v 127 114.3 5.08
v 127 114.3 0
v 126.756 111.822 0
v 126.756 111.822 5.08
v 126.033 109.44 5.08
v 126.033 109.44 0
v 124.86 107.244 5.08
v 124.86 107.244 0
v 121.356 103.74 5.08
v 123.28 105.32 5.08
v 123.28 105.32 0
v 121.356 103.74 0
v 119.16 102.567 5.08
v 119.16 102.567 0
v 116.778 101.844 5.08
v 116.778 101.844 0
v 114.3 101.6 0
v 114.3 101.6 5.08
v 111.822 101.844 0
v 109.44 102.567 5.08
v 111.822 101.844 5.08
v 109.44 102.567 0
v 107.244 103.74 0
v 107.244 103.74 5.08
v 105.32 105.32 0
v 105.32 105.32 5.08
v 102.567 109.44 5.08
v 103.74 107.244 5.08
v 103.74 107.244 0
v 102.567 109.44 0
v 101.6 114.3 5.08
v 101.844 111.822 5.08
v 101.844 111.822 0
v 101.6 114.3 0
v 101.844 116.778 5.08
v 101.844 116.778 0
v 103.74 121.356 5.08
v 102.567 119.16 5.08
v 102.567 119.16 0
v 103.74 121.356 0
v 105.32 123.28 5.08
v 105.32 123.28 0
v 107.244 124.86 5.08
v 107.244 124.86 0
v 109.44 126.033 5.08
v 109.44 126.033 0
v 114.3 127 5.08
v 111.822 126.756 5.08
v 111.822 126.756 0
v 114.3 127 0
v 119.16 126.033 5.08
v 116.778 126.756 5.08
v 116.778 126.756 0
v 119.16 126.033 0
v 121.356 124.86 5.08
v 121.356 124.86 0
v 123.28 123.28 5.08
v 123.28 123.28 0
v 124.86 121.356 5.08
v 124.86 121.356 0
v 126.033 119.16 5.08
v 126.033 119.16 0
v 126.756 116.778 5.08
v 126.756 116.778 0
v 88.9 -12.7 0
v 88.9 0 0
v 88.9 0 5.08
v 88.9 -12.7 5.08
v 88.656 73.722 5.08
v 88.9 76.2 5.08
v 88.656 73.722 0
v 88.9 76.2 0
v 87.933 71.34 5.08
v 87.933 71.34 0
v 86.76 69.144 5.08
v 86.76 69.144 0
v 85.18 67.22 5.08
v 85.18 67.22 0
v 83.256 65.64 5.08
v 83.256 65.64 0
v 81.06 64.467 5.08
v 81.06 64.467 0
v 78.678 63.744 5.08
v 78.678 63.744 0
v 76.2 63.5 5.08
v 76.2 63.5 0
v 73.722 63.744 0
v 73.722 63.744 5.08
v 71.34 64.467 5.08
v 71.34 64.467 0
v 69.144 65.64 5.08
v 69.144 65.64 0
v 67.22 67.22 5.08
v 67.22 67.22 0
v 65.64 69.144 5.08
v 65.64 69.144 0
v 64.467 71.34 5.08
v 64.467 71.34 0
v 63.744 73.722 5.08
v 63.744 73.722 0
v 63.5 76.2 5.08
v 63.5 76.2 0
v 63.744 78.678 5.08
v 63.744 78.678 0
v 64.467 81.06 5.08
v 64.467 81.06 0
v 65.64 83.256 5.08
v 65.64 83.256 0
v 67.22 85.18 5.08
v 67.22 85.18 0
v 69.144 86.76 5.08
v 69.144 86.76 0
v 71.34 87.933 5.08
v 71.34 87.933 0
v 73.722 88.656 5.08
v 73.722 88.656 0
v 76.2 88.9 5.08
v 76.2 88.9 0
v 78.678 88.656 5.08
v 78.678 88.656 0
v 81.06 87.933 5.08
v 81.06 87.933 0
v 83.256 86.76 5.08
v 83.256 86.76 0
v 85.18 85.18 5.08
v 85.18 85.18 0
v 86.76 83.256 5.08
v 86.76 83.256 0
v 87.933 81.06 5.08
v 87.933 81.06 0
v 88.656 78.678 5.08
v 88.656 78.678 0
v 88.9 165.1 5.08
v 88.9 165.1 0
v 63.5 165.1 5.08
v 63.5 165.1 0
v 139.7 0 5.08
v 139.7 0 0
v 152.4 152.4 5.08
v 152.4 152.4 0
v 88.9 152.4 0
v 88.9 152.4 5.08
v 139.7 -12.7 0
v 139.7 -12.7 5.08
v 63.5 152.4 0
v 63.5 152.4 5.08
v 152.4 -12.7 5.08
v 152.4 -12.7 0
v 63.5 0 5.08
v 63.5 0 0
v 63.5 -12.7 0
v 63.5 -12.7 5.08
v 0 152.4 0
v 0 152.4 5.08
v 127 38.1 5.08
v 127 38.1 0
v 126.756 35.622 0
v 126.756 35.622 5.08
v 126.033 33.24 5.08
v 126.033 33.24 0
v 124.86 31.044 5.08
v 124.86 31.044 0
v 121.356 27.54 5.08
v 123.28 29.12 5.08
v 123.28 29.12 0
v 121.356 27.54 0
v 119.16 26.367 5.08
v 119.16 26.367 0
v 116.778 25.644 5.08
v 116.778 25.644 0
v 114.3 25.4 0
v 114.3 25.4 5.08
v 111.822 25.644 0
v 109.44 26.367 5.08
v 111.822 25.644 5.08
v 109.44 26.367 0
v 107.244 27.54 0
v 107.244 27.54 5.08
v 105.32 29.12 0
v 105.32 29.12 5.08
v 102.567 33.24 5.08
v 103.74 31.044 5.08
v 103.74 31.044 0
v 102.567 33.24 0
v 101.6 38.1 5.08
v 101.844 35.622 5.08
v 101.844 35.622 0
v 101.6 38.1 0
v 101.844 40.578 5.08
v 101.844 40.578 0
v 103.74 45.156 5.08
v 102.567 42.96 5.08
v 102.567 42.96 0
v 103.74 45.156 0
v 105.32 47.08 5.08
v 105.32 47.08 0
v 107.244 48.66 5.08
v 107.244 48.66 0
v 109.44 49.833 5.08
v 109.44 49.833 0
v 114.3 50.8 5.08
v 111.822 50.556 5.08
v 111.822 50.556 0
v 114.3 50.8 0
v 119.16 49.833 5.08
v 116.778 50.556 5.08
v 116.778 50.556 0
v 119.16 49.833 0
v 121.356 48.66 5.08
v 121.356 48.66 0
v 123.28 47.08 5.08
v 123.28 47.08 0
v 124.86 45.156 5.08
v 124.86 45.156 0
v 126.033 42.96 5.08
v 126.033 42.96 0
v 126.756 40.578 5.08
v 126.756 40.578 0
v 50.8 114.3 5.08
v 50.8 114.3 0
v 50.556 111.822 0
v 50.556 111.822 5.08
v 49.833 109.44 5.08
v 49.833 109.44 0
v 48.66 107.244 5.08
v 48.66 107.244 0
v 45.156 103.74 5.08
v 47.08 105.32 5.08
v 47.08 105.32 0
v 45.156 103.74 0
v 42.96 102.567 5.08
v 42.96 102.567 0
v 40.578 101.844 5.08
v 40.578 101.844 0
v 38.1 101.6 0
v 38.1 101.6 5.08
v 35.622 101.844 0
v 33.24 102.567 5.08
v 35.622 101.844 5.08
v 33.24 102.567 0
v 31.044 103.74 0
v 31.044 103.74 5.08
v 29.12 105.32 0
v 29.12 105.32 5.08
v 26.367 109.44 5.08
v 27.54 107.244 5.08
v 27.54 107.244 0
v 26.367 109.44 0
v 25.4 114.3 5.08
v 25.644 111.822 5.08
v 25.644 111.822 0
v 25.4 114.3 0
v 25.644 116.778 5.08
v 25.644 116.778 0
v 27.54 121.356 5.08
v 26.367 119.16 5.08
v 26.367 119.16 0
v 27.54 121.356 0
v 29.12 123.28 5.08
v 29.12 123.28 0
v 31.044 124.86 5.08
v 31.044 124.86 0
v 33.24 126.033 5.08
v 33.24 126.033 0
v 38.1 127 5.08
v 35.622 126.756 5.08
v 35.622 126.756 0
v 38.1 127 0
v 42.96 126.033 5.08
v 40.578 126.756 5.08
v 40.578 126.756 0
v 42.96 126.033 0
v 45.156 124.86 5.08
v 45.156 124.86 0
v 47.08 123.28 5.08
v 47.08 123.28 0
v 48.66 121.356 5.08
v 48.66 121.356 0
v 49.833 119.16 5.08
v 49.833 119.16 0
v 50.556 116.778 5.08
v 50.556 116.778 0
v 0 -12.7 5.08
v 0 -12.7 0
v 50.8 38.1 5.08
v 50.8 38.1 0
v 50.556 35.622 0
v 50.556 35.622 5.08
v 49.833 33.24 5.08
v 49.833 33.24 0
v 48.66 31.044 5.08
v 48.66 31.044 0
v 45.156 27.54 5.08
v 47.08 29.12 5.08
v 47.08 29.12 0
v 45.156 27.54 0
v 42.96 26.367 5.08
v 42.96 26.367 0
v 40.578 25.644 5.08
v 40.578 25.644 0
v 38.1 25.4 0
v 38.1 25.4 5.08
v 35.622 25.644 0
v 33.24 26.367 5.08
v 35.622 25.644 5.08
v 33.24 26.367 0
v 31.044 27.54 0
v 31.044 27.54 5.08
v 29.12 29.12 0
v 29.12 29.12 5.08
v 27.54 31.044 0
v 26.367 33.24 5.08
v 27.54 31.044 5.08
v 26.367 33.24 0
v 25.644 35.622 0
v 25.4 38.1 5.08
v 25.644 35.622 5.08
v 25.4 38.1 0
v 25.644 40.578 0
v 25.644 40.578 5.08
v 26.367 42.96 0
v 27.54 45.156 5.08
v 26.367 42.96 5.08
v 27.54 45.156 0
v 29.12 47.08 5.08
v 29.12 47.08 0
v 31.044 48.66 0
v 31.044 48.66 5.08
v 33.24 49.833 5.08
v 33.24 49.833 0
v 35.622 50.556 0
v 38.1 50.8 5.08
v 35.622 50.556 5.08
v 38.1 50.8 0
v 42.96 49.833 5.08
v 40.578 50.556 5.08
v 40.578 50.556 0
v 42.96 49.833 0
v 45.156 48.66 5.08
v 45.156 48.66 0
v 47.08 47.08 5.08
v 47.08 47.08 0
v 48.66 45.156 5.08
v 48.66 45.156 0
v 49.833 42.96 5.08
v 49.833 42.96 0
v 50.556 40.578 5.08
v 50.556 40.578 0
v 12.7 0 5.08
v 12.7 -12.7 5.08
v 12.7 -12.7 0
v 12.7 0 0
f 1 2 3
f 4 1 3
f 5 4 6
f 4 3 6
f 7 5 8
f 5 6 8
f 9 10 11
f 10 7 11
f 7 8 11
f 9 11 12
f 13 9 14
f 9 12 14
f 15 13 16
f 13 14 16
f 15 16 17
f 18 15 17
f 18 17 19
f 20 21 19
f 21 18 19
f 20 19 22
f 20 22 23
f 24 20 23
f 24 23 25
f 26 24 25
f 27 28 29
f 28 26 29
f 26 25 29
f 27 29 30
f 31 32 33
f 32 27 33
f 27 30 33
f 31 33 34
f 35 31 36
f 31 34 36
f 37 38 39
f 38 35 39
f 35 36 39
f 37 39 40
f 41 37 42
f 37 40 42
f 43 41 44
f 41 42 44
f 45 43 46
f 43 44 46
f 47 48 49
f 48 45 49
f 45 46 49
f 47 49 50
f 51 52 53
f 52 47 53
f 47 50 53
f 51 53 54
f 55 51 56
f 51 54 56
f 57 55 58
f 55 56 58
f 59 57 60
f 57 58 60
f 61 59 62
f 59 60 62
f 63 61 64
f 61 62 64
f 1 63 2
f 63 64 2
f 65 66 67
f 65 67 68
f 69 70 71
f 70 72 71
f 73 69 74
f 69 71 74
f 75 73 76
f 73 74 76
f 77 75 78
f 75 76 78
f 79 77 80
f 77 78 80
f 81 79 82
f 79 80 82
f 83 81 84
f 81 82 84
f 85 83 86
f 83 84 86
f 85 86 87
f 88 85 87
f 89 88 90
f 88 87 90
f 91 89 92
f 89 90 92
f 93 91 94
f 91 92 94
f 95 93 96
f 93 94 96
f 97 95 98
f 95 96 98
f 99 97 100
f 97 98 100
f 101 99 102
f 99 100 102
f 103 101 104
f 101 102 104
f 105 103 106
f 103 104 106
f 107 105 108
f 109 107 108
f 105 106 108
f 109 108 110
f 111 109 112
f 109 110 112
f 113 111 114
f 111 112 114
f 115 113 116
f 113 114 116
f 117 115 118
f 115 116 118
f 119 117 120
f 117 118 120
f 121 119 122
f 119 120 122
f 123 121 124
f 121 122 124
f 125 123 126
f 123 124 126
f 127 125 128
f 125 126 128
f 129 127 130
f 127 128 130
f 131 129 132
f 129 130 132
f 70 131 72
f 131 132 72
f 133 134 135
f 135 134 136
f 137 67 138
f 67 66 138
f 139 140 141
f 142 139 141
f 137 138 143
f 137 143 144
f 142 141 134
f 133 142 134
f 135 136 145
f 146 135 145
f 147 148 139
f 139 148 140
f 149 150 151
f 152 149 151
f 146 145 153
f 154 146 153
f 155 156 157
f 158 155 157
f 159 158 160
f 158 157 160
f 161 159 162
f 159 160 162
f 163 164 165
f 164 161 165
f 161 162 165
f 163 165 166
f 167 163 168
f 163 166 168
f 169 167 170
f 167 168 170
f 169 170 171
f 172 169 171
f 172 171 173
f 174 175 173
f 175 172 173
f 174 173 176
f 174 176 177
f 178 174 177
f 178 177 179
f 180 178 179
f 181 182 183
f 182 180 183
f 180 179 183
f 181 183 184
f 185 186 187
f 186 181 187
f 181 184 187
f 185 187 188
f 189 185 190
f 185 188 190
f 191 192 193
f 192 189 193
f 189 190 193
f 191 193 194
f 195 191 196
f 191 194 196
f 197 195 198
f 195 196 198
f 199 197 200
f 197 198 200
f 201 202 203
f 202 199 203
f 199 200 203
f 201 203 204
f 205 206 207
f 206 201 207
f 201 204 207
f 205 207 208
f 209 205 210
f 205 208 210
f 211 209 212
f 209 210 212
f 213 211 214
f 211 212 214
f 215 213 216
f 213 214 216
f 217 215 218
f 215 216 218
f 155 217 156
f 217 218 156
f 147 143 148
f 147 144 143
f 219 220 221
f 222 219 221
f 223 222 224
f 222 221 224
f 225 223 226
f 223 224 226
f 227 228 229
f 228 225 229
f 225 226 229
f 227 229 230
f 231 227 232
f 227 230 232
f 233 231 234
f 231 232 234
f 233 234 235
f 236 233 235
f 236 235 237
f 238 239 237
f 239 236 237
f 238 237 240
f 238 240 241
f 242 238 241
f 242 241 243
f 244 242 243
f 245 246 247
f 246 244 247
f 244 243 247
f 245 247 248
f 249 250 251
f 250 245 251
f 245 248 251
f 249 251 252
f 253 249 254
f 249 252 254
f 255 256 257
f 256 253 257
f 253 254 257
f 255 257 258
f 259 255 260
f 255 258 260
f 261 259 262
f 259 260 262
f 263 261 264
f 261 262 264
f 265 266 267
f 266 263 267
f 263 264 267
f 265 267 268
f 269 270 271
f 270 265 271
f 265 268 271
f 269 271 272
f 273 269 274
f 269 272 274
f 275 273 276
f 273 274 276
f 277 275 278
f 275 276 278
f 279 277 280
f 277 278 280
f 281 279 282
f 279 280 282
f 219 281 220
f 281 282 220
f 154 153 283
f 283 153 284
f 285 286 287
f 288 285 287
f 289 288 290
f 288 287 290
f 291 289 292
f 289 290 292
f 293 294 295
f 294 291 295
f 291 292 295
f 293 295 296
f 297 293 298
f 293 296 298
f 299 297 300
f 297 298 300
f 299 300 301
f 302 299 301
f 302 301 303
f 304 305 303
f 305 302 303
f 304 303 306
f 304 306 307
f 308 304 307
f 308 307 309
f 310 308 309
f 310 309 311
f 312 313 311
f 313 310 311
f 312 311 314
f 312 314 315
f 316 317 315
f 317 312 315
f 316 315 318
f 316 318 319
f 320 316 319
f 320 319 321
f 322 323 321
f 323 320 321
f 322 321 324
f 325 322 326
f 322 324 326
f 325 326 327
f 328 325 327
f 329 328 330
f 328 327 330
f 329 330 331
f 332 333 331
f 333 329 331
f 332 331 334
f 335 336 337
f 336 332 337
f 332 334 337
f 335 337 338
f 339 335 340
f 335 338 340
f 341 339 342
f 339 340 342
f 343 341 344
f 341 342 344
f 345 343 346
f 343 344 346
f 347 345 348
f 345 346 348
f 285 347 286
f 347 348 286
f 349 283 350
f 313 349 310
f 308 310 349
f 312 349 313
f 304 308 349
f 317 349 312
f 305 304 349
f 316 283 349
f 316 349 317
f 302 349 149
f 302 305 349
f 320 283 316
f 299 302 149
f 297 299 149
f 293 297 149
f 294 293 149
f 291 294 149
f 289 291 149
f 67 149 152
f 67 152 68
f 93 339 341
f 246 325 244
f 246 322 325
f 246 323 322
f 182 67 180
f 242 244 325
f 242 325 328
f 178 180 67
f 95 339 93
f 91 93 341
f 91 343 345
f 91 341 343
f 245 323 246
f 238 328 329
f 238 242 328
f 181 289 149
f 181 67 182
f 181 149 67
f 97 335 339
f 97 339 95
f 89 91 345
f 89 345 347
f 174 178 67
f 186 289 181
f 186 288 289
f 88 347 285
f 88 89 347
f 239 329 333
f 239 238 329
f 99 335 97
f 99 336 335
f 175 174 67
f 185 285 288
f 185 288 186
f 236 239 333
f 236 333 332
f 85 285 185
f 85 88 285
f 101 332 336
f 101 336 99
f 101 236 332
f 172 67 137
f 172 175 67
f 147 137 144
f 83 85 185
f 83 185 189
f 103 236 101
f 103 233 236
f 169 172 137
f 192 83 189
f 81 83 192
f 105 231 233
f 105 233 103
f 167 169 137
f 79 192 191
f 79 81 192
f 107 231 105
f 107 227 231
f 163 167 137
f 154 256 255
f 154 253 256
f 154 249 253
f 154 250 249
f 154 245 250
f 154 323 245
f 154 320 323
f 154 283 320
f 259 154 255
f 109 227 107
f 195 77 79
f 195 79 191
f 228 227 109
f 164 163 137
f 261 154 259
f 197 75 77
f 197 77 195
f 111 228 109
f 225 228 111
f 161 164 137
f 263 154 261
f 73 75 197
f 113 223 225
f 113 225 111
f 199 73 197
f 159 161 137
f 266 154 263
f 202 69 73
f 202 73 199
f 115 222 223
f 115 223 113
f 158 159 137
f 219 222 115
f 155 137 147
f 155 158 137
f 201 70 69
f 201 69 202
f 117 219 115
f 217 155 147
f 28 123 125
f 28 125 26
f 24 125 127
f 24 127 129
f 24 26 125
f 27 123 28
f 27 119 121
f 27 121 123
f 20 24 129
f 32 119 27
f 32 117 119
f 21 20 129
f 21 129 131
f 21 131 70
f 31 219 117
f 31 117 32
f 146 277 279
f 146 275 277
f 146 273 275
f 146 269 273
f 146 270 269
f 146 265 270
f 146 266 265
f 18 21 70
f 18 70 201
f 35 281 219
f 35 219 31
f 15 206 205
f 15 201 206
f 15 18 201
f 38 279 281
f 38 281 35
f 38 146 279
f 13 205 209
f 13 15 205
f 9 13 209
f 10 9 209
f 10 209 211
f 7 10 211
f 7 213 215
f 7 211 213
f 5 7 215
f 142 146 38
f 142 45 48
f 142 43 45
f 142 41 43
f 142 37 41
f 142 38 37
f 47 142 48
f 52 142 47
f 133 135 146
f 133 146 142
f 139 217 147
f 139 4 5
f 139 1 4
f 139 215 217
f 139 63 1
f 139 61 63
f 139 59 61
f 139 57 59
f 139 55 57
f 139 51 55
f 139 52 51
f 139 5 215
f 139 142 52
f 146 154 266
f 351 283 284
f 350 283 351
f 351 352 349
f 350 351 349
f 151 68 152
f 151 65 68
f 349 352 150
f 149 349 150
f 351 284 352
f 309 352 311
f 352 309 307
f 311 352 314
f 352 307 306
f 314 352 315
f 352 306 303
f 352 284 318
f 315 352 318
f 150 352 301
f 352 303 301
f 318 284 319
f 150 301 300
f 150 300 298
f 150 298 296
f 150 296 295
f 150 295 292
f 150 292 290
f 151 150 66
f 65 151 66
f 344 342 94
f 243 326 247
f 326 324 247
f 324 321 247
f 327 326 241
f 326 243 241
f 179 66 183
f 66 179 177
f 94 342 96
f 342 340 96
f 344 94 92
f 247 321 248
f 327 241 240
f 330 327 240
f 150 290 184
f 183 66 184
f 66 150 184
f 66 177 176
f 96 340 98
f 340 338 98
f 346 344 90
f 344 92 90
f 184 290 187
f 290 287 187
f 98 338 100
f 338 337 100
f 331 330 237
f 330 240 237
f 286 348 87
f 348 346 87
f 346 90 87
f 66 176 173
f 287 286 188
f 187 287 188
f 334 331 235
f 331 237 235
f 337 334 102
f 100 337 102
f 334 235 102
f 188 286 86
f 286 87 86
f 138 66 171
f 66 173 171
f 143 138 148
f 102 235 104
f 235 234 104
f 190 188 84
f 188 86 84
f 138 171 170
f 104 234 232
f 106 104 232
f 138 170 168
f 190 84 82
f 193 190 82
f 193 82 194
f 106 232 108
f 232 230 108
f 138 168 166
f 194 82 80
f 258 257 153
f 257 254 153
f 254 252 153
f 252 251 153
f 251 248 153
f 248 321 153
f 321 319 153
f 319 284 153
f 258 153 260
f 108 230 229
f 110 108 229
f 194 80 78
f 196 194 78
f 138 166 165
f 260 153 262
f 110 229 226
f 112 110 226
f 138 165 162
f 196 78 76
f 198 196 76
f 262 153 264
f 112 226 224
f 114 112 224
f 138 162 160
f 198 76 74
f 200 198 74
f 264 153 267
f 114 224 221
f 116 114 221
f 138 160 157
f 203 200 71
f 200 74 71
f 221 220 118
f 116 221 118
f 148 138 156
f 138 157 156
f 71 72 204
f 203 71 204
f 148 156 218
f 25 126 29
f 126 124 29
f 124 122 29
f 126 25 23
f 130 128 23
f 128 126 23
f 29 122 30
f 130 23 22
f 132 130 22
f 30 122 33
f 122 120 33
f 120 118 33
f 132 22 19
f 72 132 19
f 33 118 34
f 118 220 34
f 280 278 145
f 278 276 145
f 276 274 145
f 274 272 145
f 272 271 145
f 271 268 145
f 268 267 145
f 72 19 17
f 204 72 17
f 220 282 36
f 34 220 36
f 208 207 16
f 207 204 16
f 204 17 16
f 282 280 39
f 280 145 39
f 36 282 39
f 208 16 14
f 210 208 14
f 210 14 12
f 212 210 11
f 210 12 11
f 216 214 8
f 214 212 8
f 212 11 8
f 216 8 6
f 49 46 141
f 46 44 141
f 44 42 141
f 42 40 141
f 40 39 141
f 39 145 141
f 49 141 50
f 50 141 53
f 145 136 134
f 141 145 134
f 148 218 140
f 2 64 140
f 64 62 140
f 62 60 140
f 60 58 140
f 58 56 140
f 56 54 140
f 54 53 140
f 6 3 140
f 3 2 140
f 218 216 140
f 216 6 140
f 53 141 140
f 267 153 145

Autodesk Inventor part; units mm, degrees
ref_plane "YZ Plane" through (0, 0, 0) normal (1, 0, 0) x (0, 1, 0)
ref_plane "XZ Plane" through (0, 0, 0) normal (0, 1, 0) x (-1, 0, 0)
ref_plane "XY Plane" through (0, 0, 0) normal (0, 0, 1) x (1, 0, 0)
sketch "Sketch1" plane through (0, 0, 0) normal (0, 0, 1) x (1, 0, 0)
  line L0 (0, 0) -> (152.4, 0)
  line L1 (152.4, 0) -> (152.4, 152.4)
  line L2 (0, 152.4) -> (0, 0)
  line L3 (88.9, 152.4) -> (88.9, 165.1)
  line L4 (88.9, 165.1) -> (76.2, 165.1)
  line L5 (76.2, 165.1) -> (63.5, 165.1)
  line L6 (63.5, 165.1) -> (63.5, 152.4)
  line L7 (152.4, 152.4) -> (88.9, 152.4)
  line L8 (63.5, 152.4) -> (0, 152.4)
  circle A0 centre (38.1, 114.3) radius 12.7
  circle A1 centre (114.3, 114.3) radius 12.7
  circle A2 centre (76.2, 76.2) radius 12.7
  circle A3 centre (38.1, 38.1) radius 12.7
  circle A4 centre (114.3, 38.1) radius 12.7
  line L9 (63.5, 152.4) -> (63.5, -12.7)
  line L10 (88.9, 152.4) -> (88.9, -12.7)
  line L11 (63.5, 0) -> (88.9, 0)
  line L12 (88.9, 0) -> (88.9, -12.7)
  line L13 (88.9, -12.7) -> (63.5, -12.7)
  line L14 (63.5, -12.7) -> (63.5, 0)
  dimension "d0" = 152.4
  dimension "d1" = 152.4
  dimension "d5" = 12.7
  dimension "d6" = 12.7
  dimension "d7" = 12.7
  dimension "d8" = 12.7
  dimension "d9" = 63.5
  dimension "d10" = 90
  dimension "d11" = 25.4
  dimension "d12" = 25.4
  dimension "d13" = 25.4
  dimension "d14" = 25.4
  dimension "d15" = 25.4
  dimension "d16" = 38.1
  dimension "d17" = 38.1
  dimension "d18" = 38.1
  dimension "d19" = 38.1
  dimension "d20" = 76.2
  dimension "d21" = 76.2
  dimension "d22" = 38.1
  dimension "d23" = 38.1
  dimension "d24" = 38.1
  dimension "d25" = 38.1
  dimension "d26" = 12.7
extrude "Extrusion1" add sketch "Sketch1" along normal blind 5.08 contours L2 L8 L9 L0 | L9 A2 L10 L0 | L0 L10 L13 L9 | L10 L7 L1 L0 | L9 L6 L5 L4 L3 L10 A2
sketch "Sketch2" plane through (0, 0, 0) normal (0, -1, 0) x (1, 0, 0)
  line L0 (63.5, 5.08) -> (0, 5.08) projected
  line L1 (0, 0) -> (12.7, 0)
  line L2 (12.7, 0) -> (12.7, 5.08)
  line L3 (12.7, 5.08) -> (0, 5.08)
  line L4 (0, 5.08) -> (0, 0)
  line L5 (88.9, 5.08) -> (152.4, 5.08) projected
  line L6 (152.4, 0) -> (139.7, 0)
  line L7 (139.7, 0) -> (139.7, 5.08)
  line L8 (139.7, 5.08) -> (152.4, 5.08)
  line L9 (152.4, 5.08) -> (152.4, 0)
  dimension "d29" = 12.7
  dimension "d31" = 12.7
extrude "Extrusion2" add sketch "Sketch2" along normal blind 12.7
properties part number "Heating Plate"
